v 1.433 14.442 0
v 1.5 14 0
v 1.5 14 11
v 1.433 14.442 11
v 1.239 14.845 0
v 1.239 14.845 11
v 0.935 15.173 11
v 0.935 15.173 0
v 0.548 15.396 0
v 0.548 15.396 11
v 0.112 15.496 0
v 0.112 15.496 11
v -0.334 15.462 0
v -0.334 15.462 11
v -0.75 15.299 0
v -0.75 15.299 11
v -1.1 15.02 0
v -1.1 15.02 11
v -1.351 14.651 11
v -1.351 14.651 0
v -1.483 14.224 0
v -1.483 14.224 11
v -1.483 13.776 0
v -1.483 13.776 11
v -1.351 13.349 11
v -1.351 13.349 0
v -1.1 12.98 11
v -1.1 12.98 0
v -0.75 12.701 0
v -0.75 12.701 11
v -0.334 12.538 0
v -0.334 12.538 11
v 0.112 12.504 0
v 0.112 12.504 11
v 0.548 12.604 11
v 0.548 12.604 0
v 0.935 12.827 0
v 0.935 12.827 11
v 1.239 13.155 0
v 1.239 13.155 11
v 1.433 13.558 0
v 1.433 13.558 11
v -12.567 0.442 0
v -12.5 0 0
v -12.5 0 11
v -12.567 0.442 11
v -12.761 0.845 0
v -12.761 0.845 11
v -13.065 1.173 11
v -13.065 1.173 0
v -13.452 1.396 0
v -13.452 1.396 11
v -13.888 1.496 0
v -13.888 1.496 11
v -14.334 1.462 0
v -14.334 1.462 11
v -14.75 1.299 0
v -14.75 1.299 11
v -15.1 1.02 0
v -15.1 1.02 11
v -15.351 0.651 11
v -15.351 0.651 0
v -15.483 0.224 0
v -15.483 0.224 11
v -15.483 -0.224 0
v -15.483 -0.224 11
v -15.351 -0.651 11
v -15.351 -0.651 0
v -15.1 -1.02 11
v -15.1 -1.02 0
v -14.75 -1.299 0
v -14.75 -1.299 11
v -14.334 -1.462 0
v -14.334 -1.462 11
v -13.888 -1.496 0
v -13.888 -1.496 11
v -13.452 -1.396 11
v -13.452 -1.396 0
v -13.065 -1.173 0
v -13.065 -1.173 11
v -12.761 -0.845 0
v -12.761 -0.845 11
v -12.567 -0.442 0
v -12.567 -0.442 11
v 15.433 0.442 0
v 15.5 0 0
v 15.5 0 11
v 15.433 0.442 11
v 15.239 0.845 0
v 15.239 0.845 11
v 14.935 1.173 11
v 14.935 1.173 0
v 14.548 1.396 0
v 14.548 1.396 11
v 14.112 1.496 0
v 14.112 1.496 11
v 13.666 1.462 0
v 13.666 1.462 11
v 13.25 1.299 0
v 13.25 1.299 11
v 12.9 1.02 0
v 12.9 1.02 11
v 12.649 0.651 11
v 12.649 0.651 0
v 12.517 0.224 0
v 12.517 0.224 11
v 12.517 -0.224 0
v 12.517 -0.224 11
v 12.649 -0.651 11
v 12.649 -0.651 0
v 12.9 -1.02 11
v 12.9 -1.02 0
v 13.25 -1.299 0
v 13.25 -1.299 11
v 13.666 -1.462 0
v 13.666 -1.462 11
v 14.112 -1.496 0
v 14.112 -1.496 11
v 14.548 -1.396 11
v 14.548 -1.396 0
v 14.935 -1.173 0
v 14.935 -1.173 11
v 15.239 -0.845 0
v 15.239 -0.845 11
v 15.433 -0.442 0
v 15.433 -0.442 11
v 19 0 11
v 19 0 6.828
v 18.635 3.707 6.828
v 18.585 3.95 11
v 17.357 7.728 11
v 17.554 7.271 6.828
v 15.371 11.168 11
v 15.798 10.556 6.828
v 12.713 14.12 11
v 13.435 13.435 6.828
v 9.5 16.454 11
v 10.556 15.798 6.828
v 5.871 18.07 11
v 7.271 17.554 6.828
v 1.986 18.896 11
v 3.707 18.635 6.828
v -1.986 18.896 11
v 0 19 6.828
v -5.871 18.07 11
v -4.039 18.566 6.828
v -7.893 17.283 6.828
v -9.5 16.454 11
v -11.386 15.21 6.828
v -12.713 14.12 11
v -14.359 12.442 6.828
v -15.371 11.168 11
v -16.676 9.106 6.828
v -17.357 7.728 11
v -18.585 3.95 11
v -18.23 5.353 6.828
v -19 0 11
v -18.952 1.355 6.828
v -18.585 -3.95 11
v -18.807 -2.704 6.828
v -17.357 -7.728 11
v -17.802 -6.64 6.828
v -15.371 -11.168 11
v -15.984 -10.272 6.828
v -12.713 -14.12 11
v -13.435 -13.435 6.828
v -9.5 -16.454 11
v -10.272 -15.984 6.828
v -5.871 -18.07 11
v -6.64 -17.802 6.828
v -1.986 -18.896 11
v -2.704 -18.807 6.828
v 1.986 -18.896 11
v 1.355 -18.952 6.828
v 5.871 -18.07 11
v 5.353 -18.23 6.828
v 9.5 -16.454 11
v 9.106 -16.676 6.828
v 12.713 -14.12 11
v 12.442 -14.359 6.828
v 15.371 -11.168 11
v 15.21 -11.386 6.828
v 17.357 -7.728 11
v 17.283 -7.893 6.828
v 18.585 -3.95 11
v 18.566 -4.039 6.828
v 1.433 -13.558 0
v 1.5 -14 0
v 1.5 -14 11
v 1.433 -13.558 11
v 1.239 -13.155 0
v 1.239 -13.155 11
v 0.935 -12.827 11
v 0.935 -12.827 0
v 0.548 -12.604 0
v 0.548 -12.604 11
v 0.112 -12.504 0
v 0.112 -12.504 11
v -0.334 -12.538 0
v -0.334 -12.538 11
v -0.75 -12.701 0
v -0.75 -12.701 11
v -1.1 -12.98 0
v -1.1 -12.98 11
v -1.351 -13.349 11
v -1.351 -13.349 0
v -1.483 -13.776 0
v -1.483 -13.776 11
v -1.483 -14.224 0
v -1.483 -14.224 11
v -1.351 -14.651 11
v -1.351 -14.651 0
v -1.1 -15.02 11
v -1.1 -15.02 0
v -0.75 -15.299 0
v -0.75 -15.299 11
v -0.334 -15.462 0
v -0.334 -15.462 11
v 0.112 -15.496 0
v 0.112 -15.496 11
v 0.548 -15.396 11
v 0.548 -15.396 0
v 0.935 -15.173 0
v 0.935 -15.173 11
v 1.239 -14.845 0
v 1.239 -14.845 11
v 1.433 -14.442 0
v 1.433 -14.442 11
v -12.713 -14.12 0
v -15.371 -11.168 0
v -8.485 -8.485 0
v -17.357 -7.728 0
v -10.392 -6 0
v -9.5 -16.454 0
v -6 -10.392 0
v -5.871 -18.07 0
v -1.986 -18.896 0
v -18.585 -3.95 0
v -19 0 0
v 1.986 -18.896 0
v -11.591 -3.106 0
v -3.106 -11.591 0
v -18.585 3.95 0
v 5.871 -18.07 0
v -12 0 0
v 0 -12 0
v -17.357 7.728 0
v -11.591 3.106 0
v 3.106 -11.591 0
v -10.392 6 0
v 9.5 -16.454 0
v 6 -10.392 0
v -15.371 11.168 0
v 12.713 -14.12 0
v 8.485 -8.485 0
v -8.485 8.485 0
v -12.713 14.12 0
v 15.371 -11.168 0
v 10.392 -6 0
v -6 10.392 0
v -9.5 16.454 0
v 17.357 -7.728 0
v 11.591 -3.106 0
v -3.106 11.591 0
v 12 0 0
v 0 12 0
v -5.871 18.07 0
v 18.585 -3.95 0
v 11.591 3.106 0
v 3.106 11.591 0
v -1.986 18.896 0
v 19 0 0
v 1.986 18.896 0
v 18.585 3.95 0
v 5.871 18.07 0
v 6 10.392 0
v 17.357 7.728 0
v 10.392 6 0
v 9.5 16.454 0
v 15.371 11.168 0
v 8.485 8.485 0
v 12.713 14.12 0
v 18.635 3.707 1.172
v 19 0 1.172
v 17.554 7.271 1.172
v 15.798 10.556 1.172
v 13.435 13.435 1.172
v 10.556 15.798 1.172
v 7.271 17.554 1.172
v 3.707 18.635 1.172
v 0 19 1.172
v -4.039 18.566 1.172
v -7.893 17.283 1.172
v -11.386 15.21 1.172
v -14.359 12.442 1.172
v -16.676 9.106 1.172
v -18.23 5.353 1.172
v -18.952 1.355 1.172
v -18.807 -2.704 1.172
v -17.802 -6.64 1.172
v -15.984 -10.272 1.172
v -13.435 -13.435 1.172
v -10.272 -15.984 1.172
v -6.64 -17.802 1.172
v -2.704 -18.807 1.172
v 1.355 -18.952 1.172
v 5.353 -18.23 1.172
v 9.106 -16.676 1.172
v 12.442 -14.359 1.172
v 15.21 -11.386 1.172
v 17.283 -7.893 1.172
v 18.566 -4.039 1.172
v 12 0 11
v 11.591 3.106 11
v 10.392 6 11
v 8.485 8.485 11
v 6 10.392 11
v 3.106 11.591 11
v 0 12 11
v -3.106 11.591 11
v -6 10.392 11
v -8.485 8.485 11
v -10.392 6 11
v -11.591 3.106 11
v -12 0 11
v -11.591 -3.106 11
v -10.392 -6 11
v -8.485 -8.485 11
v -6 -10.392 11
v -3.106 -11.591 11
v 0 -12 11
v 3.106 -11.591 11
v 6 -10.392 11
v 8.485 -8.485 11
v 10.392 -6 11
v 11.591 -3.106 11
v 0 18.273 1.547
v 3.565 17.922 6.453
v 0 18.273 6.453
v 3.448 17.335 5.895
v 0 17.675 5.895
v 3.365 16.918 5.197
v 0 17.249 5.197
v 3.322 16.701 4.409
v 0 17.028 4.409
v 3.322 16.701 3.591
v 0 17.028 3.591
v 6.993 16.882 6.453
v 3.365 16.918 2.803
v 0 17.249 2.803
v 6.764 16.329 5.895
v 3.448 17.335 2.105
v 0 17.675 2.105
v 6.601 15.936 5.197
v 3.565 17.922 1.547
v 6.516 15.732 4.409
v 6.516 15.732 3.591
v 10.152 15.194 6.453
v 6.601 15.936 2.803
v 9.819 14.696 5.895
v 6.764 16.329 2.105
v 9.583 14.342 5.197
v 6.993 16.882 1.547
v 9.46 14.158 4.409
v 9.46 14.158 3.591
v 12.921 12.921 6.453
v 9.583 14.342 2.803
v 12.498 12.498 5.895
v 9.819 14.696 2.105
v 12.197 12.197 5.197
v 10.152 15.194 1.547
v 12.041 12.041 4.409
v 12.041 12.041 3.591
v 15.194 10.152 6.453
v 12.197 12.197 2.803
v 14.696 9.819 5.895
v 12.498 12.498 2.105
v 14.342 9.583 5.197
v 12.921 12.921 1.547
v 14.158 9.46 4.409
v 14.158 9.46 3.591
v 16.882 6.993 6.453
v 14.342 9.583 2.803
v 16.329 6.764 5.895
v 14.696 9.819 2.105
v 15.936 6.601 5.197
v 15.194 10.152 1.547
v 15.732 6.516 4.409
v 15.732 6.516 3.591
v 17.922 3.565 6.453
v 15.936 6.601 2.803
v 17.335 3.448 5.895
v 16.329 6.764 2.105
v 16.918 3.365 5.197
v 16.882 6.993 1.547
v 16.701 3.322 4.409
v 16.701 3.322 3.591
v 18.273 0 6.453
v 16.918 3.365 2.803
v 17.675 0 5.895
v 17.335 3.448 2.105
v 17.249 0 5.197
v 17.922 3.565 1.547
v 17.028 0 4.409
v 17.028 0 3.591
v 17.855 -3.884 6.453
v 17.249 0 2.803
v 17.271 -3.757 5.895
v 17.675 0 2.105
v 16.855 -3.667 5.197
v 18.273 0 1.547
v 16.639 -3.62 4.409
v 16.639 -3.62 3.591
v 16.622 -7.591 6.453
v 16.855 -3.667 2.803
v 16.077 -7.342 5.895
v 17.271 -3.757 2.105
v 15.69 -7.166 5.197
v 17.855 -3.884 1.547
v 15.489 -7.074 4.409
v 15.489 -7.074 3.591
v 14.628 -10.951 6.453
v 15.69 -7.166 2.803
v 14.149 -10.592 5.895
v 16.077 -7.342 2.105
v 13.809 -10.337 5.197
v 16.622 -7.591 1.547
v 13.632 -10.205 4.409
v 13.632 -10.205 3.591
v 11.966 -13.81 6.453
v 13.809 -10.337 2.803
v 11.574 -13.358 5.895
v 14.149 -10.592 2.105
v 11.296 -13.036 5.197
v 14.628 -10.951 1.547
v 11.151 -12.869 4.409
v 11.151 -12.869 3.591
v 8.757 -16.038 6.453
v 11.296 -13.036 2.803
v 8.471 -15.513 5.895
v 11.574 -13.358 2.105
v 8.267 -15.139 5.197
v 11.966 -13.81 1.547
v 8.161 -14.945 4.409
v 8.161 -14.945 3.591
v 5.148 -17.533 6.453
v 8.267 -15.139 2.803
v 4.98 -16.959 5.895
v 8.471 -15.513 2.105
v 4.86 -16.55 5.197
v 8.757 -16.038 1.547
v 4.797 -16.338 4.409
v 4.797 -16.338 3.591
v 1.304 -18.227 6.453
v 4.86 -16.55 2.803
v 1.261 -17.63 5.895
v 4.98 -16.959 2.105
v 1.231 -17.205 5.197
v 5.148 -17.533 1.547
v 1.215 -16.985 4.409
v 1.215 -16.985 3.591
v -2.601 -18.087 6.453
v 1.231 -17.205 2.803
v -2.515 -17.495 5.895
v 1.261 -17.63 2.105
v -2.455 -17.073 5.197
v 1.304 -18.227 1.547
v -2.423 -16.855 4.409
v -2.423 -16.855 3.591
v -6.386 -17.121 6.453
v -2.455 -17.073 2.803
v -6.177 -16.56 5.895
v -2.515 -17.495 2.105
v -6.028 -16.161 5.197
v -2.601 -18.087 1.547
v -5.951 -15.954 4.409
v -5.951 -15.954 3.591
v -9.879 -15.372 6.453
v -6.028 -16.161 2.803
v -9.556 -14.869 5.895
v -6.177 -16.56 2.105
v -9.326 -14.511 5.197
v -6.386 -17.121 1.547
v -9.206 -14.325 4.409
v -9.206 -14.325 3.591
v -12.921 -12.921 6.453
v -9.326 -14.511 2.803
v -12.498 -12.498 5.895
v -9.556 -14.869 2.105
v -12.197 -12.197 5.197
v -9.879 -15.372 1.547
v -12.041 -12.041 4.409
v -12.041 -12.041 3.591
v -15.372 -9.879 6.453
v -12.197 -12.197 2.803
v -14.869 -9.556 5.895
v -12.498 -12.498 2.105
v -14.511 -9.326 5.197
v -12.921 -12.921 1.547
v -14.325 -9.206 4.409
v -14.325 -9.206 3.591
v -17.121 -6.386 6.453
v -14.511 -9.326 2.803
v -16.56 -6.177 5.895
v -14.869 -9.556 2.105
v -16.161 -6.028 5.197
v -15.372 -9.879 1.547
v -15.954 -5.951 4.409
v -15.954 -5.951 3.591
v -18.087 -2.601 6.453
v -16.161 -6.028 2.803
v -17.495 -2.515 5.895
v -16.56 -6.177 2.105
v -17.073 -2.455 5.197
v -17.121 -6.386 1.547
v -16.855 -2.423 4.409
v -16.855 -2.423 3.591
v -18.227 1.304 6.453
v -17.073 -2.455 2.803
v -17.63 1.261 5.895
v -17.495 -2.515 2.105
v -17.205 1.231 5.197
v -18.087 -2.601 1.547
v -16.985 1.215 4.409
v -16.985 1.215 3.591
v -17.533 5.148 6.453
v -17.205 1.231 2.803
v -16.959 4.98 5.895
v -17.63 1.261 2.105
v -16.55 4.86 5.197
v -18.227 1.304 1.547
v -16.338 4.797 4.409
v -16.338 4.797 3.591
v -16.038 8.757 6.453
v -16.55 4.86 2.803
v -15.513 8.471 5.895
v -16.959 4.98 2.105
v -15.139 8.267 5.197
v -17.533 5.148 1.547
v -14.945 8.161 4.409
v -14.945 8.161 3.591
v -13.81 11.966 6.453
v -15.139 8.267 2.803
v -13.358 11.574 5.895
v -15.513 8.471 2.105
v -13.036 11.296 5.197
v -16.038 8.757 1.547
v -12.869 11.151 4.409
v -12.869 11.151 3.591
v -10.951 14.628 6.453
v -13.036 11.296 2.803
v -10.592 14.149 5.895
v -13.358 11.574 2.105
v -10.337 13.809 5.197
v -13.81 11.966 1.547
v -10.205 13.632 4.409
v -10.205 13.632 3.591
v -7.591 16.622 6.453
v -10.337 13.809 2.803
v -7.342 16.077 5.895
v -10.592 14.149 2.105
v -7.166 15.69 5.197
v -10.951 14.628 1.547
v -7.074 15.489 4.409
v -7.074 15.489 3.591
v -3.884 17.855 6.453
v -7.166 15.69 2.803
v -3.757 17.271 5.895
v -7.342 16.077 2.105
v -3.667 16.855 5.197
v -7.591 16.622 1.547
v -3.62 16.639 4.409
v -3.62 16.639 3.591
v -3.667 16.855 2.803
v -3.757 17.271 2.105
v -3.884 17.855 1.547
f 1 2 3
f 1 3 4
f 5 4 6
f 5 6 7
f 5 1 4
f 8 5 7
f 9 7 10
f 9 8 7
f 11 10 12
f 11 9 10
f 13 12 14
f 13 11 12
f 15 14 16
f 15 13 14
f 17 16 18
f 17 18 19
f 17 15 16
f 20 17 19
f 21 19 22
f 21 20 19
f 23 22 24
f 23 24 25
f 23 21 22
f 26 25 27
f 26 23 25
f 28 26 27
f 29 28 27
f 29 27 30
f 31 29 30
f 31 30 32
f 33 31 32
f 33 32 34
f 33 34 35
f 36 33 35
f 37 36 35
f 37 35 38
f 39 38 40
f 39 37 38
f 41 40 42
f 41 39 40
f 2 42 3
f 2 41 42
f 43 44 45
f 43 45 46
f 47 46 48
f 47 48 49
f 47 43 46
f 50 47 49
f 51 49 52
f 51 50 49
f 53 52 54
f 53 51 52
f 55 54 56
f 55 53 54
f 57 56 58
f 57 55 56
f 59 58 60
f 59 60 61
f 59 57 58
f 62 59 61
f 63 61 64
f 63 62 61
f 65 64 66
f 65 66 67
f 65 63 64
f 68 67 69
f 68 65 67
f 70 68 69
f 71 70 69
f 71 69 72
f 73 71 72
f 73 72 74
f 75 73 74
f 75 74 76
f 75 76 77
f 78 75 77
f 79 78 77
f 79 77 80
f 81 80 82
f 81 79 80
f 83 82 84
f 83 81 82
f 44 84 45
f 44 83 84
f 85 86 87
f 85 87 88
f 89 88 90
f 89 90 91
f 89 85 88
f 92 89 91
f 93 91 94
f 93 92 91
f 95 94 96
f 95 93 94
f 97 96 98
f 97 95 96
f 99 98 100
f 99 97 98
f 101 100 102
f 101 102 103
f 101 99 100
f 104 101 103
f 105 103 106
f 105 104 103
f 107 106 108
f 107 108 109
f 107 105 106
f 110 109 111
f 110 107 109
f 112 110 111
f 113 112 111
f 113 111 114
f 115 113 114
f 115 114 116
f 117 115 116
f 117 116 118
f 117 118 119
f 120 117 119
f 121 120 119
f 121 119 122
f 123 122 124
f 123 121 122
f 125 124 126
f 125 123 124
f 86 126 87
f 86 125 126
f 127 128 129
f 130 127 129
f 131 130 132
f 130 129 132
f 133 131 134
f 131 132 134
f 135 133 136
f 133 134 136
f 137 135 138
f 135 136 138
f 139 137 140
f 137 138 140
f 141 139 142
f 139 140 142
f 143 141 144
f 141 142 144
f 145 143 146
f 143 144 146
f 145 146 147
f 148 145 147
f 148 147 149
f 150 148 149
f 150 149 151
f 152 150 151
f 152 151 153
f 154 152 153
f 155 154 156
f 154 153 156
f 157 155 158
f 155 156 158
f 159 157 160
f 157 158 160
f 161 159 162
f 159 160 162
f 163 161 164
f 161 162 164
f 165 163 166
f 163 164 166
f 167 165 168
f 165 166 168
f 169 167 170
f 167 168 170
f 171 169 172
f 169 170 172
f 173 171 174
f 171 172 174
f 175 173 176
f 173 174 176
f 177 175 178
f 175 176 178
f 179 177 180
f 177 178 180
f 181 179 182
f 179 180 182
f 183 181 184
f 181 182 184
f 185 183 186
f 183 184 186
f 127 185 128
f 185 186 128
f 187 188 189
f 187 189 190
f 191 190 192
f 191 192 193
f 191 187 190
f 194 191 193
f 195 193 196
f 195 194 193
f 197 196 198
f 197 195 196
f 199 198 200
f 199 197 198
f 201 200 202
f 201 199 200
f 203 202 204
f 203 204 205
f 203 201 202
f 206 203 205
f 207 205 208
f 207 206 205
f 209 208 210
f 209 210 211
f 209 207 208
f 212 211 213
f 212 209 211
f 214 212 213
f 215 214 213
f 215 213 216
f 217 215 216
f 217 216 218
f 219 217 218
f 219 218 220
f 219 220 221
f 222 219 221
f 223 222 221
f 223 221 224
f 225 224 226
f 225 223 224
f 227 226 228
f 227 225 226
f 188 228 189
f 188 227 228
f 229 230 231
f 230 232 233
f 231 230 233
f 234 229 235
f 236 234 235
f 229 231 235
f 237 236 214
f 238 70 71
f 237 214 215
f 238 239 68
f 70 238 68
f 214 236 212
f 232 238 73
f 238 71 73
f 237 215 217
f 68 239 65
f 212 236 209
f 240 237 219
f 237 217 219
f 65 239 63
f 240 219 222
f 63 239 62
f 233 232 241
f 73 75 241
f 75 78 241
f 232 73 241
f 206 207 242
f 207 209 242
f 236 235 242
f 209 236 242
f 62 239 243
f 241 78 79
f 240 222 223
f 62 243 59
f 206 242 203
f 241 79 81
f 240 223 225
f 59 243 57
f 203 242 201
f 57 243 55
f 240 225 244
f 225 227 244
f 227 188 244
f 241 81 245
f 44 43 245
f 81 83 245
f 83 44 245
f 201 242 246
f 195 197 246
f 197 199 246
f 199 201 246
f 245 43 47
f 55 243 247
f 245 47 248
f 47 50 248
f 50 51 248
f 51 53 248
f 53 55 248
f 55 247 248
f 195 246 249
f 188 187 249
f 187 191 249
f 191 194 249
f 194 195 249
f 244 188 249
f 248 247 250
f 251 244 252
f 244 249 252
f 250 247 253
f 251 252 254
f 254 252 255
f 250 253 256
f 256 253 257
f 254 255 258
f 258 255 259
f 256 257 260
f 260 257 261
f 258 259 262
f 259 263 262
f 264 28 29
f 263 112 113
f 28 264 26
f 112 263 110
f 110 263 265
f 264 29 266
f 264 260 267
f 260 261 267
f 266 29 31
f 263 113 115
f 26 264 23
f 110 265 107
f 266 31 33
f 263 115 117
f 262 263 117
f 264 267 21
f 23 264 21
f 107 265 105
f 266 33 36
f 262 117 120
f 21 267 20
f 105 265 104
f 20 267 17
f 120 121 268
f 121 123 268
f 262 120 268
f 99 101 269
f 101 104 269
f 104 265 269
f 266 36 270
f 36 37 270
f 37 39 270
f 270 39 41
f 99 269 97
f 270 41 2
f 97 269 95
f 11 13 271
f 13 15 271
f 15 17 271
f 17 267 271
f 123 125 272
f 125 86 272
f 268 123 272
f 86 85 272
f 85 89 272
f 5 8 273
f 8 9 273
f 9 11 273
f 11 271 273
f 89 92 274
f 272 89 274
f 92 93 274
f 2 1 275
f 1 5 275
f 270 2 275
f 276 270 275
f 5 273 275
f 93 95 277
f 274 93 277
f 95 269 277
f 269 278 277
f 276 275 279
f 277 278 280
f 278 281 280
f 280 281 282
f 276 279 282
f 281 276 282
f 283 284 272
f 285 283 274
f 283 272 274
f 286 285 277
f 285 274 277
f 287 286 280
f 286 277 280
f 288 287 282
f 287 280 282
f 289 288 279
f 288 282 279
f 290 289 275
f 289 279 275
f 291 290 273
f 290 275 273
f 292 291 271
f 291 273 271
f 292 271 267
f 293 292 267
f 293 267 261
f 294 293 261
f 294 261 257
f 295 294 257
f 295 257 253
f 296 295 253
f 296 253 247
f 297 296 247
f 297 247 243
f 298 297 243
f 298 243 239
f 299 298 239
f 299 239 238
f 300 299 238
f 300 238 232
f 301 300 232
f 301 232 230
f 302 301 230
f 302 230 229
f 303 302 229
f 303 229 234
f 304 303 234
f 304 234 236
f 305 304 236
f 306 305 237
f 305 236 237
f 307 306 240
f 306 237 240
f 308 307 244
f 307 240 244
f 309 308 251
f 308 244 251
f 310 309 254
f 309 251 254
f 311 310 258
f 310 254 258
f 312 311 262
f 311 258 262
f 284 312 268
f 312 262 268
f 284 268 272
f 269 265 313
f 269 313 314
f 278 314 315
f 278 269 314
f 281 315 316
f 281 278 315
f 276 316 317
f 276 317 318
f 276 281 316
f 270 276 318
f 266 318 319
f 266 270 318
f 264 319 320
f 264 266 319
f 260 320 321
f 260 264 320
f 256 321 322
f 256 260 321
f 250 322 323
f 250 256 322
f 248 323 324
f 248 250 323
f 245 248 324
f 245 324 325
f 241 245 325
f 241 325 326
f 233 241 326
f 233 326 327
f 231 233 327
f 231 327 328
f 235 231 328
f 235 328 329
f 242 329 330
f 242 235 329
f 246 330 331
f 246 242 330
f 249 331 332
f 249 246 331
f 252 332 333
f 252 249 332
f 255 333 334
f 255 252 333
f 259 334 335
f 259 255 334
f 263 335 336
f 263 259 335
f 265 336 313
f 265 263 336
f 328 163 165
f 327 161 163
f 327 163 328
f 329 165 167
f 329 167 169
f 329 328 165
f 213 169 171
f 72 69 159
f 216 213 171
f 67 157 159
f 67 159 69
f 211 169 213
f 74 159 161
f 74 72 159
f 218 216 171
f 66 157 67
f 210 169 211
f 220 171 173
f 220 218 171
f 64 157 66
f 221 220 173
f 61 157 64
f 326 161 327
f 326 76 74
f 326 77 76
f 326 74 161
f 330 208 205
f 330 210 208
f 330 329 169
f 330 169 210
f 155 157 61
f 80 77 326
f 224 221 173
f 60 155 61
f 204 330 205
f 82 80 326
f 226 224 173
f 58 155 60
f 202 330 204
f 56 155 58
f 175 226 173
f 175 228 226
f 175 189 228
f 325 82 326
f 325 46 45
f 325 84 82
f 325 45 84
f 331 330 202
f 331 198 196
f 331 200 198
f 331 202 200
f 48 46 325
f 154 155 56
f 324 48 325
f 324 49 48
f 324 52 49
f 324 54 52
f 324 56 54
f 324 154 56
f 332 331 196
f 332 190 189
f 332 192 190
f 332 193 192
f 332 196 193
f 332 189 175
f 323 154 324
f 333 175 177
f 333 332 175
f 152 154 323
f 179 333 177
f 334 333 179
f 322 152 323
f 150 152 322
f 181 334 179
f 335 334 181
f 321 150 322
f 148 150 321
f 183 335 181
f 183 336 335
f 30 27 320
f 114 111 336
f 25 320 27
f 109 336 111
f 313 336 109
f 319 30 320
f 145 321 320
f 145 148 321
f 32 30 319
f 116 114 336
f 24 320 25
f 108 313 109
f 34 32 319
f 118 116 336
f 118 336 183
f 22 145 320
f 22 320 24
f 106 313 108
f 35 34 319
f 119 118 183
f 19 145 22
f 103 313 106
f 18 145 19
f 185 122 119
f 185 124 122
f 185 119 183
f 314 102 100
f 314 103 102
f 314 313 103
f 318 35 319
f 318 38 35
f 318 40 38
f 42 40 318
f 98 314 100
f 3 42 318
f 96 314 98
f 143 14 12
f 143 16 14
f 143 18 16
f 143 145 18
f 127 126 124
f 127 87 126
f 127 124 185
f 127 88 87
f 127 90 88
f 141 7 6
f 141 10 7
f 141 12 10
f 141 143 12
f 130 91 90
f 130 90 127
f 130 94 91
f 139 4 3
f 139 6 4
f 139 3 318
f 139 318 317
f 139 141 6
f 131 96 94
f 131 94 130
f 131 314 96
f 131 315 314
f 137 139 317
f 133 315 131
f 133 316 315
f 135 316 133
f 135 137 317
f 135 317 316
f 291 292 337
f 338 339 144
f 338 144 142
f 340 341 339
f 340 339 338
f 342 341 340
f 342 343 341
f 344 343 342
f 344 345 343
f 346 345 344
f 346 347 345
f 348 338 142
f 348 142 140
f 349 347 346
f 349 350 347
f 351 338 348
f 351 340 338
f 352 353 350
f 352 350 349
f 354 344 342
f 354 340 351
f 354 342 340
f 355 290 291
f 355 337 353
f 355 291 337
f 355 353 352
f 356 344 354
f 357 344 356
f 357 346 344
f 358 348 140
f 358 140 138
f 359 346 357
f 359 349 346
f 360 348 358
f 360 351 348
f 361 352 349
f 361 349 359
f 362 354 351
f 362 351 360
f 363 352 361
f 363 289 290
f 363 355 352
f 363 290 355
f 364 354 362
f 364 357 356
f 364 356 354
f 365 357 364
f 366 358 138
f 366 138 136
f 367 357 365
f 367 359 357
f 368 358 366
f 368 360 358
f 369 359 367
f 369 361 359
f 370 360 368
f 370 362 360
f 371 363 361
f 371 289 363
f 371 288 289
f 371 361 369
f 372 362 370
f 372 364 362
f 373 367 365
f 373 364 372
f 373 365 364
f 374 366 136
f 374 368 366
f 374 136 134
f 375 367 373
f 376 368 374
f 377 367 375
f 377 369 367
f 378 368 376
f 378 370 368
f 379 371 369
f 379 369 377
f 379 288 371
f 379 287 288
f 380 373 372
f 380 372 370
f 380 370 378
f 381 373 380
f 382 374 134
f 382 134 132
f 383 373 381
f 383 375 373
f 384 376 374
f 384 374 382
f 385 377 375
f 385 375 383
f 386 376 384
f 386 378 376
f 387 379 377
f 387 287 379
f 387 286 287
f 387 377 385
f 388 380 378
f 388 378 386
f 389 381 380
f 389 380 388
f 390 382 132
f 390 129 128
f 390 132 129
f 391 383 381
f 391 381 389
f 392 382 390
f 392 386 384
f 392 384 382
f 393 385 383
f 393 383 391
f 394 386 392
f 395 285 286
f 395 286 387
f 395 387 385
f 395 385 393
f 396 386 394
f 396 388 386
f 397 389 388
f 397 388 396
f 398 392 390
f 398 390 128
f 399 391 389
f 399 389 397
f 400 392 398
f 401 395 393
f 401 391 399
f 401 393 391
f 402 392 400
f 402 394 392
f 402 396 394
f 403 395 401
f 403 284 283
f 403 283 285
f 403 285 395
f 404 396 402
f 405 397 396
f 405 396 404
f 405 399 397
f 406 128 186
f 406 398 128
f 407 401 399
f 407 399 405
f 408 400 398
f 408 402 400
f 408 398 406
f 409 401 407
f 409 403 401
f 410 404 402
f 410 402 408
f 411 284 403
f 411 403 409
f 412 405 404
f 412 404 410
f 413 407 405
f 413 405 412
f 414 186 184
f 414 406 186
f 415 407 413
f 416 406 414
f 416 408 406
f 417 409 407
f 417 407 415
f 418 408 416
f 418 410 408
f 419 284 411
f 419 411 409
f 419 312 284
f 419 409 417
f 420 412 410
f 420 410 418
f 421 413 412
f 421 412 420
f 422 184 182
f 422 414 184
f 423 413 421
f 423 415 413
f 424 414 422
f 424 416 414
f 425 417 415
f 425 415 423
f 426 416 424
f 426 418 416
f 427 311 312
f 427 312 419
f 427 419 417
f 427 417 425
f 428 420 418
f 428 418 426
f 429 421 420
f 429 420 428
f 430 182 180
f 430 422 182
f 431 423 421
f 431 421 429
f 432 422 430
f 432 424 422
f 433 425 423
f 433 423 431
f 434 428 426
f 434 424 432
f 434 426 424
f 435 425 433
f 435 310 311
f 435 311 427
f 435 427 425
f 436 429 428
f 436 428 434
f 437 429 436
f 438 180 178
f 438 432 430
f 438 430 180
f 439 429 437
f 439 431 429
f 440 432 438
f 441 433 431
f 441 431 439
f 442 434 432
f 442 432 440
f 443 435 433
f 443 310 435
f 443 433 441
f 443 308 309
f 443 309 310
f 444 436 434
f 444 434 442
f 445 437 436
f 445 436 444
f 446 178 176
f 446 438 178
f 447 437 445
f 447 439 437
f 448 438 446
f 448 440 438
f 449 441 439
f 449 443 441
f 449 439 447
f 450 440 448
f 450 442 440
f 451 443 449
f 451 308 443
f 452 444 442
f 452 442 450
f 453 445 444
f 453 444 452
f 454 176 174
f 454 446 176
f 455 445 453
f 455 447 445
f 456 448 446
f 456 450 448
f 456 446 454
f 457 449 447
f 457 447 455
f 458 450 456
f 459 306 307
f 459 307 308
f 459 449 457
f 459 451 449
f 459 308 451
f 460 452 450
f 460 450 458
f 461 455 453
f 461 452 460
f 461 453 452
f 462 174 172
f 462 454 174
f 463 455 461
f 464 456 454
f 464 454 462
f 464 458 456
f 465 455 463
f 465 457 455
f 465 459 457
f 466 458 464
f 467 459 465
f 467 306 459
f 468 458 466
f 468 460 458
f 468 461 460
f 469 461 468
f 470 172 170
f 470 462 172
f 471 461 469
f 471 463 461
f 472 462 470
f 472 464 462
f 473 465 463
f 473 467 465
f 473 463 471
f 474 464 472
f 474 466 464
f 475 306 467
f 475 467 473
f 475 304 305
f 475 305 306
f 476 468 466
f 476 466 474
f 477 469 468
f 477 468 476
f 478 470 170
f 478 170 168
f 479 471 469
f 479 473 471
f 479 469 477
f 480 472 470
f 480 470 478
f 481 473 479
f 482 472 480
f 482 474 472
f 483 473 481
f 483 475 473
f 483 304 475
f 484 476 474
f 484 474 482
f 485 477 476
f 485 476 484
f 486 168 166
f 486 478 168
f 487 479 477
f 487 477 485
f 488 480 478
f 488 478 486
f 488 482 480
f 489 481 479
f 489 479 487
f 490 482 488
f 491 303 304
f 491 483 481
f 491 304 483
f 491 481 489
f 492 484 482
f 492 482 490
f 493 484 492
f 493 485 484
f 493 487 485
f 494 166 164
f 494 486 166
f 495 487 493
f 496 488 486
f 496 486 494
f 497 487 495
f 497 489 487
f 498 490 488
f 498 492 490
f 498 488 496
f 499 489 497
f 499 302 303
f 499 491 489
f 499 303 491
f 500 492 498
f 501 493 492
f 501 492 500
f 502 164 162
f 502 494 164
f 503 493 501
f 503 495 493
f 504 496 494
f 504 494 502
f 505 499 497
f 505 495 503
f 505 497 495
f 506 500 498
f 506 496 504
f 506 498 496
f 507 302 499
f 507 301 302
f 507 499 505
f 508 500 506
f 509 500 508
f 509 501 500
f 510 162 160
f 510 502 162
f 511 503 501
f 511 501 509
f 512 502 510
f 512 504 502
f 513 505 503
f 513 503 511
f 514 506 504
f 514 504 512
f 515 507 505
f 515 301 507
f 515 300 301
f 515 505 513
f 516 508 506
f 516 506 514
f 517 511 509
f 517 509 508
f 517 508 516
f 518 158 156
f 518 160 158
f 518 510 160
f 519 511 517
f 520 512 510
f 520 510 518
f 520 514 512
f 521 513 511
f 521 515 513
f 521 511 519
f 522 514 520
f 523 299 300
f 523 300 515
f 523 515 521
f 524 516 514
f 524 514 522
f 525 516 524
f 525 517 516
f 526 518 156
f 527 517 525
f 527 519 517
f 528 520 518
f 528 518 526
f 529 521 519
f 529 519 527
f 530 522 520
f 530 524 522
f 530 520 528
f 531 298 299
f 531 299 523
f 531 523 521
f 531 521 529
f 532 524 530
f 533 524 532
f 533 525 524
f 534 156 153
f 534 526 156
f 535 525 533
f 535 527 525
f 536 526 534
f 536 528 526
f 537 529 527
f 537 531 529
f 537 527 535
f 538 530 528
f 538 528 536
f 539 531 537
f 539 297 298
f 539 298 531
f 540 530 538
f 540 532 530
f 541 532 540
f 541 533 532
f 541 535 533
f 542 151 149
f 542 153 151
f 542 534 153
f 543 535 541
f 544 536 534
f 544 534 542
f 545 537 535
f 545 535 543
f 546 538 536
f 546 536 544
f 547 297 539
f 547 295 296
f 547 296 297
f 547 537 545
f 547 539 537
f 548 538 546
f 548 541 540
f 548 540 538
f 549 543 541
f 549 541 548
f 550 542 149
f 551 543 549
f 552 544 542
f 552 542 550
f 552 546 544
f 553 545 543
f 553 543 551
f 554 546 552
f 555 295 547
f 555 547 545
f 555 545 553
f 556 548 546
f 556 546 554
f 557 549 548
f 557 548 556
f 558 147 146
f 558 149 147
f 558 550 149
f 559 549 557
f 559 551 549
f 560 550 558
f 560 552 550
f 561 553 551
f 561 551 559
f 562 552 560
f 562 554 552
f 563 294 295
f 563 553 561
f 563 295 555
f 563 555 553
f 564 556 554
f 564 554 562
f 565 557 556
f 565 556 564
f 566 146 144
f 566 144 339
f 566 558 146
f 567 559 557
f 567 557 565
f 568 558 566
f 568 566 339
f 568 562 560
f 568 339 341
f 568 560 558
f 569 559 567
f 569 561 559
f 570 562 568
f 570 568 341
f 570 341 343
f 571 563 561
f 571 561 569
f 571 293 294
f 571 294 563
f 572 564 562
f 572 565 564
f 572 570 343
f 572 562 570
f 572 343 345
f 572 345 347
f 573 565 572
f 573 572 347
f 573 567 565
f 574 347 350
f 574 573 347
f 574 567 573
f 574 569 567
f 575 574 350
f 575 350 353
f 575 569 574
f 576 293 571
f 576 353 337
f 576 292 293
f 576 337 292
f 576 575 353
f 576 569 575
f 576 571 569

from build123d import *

# Parameters (mm, degrees)
SCHIZZO1_R                   = 19
SCHIZZO1_R_2                 = 12
SCHIZZO1_R_3                 = 1.5
ESTRUSIONE_ESTRUSIONE1_DEPTH = 11
SCHIZZO2_R                   = 3


with BuildPart() as part:
    # Schizzo1 → Estrusione-Estrusione1 (new body)
    with BuildSketch(Plane.XY):
        Circle(SCHIZZO1_R)
        Circle(SCHIZZO1_R_2, mode=Mode.SUBTRACT)
        with Locations((0, 14)):
            Circle(SCHIZZO1_R_3, mode=Mode.SUBTRACT)
        with Locations((14, 0)):
            Circle(SCHIZZO1_R_3, mode=Mode.SUBTRACT)
        with Locations((0, -14)):
            Circle(SCHIZZO1_R_3, mode=Mode.SUBTRACT)
        with Locations((-14, 0)):
            Circle(SCHIZZO1_R_3, mode=Mode.SUBTRACT)
    extrude(amount=ESTRUSIONE_ESTRUSIONE1_DEPTH)

    # Schizzo2 → Taglia-Rivoluzione1 (revolve, cut)
    with BuildSketch(Plane(origin=(0, 0, 0), x_dir=(0, 0, -1), z_dir=(1, 0, 0))):
        with Locations((-4, 20)):
            Circle(SCHIZZO2_R)
    revolve(axis=Axis((0, 0, 11), (0, 0, -1)), mode=Mode.SUBTRACT)


solid = part.part
